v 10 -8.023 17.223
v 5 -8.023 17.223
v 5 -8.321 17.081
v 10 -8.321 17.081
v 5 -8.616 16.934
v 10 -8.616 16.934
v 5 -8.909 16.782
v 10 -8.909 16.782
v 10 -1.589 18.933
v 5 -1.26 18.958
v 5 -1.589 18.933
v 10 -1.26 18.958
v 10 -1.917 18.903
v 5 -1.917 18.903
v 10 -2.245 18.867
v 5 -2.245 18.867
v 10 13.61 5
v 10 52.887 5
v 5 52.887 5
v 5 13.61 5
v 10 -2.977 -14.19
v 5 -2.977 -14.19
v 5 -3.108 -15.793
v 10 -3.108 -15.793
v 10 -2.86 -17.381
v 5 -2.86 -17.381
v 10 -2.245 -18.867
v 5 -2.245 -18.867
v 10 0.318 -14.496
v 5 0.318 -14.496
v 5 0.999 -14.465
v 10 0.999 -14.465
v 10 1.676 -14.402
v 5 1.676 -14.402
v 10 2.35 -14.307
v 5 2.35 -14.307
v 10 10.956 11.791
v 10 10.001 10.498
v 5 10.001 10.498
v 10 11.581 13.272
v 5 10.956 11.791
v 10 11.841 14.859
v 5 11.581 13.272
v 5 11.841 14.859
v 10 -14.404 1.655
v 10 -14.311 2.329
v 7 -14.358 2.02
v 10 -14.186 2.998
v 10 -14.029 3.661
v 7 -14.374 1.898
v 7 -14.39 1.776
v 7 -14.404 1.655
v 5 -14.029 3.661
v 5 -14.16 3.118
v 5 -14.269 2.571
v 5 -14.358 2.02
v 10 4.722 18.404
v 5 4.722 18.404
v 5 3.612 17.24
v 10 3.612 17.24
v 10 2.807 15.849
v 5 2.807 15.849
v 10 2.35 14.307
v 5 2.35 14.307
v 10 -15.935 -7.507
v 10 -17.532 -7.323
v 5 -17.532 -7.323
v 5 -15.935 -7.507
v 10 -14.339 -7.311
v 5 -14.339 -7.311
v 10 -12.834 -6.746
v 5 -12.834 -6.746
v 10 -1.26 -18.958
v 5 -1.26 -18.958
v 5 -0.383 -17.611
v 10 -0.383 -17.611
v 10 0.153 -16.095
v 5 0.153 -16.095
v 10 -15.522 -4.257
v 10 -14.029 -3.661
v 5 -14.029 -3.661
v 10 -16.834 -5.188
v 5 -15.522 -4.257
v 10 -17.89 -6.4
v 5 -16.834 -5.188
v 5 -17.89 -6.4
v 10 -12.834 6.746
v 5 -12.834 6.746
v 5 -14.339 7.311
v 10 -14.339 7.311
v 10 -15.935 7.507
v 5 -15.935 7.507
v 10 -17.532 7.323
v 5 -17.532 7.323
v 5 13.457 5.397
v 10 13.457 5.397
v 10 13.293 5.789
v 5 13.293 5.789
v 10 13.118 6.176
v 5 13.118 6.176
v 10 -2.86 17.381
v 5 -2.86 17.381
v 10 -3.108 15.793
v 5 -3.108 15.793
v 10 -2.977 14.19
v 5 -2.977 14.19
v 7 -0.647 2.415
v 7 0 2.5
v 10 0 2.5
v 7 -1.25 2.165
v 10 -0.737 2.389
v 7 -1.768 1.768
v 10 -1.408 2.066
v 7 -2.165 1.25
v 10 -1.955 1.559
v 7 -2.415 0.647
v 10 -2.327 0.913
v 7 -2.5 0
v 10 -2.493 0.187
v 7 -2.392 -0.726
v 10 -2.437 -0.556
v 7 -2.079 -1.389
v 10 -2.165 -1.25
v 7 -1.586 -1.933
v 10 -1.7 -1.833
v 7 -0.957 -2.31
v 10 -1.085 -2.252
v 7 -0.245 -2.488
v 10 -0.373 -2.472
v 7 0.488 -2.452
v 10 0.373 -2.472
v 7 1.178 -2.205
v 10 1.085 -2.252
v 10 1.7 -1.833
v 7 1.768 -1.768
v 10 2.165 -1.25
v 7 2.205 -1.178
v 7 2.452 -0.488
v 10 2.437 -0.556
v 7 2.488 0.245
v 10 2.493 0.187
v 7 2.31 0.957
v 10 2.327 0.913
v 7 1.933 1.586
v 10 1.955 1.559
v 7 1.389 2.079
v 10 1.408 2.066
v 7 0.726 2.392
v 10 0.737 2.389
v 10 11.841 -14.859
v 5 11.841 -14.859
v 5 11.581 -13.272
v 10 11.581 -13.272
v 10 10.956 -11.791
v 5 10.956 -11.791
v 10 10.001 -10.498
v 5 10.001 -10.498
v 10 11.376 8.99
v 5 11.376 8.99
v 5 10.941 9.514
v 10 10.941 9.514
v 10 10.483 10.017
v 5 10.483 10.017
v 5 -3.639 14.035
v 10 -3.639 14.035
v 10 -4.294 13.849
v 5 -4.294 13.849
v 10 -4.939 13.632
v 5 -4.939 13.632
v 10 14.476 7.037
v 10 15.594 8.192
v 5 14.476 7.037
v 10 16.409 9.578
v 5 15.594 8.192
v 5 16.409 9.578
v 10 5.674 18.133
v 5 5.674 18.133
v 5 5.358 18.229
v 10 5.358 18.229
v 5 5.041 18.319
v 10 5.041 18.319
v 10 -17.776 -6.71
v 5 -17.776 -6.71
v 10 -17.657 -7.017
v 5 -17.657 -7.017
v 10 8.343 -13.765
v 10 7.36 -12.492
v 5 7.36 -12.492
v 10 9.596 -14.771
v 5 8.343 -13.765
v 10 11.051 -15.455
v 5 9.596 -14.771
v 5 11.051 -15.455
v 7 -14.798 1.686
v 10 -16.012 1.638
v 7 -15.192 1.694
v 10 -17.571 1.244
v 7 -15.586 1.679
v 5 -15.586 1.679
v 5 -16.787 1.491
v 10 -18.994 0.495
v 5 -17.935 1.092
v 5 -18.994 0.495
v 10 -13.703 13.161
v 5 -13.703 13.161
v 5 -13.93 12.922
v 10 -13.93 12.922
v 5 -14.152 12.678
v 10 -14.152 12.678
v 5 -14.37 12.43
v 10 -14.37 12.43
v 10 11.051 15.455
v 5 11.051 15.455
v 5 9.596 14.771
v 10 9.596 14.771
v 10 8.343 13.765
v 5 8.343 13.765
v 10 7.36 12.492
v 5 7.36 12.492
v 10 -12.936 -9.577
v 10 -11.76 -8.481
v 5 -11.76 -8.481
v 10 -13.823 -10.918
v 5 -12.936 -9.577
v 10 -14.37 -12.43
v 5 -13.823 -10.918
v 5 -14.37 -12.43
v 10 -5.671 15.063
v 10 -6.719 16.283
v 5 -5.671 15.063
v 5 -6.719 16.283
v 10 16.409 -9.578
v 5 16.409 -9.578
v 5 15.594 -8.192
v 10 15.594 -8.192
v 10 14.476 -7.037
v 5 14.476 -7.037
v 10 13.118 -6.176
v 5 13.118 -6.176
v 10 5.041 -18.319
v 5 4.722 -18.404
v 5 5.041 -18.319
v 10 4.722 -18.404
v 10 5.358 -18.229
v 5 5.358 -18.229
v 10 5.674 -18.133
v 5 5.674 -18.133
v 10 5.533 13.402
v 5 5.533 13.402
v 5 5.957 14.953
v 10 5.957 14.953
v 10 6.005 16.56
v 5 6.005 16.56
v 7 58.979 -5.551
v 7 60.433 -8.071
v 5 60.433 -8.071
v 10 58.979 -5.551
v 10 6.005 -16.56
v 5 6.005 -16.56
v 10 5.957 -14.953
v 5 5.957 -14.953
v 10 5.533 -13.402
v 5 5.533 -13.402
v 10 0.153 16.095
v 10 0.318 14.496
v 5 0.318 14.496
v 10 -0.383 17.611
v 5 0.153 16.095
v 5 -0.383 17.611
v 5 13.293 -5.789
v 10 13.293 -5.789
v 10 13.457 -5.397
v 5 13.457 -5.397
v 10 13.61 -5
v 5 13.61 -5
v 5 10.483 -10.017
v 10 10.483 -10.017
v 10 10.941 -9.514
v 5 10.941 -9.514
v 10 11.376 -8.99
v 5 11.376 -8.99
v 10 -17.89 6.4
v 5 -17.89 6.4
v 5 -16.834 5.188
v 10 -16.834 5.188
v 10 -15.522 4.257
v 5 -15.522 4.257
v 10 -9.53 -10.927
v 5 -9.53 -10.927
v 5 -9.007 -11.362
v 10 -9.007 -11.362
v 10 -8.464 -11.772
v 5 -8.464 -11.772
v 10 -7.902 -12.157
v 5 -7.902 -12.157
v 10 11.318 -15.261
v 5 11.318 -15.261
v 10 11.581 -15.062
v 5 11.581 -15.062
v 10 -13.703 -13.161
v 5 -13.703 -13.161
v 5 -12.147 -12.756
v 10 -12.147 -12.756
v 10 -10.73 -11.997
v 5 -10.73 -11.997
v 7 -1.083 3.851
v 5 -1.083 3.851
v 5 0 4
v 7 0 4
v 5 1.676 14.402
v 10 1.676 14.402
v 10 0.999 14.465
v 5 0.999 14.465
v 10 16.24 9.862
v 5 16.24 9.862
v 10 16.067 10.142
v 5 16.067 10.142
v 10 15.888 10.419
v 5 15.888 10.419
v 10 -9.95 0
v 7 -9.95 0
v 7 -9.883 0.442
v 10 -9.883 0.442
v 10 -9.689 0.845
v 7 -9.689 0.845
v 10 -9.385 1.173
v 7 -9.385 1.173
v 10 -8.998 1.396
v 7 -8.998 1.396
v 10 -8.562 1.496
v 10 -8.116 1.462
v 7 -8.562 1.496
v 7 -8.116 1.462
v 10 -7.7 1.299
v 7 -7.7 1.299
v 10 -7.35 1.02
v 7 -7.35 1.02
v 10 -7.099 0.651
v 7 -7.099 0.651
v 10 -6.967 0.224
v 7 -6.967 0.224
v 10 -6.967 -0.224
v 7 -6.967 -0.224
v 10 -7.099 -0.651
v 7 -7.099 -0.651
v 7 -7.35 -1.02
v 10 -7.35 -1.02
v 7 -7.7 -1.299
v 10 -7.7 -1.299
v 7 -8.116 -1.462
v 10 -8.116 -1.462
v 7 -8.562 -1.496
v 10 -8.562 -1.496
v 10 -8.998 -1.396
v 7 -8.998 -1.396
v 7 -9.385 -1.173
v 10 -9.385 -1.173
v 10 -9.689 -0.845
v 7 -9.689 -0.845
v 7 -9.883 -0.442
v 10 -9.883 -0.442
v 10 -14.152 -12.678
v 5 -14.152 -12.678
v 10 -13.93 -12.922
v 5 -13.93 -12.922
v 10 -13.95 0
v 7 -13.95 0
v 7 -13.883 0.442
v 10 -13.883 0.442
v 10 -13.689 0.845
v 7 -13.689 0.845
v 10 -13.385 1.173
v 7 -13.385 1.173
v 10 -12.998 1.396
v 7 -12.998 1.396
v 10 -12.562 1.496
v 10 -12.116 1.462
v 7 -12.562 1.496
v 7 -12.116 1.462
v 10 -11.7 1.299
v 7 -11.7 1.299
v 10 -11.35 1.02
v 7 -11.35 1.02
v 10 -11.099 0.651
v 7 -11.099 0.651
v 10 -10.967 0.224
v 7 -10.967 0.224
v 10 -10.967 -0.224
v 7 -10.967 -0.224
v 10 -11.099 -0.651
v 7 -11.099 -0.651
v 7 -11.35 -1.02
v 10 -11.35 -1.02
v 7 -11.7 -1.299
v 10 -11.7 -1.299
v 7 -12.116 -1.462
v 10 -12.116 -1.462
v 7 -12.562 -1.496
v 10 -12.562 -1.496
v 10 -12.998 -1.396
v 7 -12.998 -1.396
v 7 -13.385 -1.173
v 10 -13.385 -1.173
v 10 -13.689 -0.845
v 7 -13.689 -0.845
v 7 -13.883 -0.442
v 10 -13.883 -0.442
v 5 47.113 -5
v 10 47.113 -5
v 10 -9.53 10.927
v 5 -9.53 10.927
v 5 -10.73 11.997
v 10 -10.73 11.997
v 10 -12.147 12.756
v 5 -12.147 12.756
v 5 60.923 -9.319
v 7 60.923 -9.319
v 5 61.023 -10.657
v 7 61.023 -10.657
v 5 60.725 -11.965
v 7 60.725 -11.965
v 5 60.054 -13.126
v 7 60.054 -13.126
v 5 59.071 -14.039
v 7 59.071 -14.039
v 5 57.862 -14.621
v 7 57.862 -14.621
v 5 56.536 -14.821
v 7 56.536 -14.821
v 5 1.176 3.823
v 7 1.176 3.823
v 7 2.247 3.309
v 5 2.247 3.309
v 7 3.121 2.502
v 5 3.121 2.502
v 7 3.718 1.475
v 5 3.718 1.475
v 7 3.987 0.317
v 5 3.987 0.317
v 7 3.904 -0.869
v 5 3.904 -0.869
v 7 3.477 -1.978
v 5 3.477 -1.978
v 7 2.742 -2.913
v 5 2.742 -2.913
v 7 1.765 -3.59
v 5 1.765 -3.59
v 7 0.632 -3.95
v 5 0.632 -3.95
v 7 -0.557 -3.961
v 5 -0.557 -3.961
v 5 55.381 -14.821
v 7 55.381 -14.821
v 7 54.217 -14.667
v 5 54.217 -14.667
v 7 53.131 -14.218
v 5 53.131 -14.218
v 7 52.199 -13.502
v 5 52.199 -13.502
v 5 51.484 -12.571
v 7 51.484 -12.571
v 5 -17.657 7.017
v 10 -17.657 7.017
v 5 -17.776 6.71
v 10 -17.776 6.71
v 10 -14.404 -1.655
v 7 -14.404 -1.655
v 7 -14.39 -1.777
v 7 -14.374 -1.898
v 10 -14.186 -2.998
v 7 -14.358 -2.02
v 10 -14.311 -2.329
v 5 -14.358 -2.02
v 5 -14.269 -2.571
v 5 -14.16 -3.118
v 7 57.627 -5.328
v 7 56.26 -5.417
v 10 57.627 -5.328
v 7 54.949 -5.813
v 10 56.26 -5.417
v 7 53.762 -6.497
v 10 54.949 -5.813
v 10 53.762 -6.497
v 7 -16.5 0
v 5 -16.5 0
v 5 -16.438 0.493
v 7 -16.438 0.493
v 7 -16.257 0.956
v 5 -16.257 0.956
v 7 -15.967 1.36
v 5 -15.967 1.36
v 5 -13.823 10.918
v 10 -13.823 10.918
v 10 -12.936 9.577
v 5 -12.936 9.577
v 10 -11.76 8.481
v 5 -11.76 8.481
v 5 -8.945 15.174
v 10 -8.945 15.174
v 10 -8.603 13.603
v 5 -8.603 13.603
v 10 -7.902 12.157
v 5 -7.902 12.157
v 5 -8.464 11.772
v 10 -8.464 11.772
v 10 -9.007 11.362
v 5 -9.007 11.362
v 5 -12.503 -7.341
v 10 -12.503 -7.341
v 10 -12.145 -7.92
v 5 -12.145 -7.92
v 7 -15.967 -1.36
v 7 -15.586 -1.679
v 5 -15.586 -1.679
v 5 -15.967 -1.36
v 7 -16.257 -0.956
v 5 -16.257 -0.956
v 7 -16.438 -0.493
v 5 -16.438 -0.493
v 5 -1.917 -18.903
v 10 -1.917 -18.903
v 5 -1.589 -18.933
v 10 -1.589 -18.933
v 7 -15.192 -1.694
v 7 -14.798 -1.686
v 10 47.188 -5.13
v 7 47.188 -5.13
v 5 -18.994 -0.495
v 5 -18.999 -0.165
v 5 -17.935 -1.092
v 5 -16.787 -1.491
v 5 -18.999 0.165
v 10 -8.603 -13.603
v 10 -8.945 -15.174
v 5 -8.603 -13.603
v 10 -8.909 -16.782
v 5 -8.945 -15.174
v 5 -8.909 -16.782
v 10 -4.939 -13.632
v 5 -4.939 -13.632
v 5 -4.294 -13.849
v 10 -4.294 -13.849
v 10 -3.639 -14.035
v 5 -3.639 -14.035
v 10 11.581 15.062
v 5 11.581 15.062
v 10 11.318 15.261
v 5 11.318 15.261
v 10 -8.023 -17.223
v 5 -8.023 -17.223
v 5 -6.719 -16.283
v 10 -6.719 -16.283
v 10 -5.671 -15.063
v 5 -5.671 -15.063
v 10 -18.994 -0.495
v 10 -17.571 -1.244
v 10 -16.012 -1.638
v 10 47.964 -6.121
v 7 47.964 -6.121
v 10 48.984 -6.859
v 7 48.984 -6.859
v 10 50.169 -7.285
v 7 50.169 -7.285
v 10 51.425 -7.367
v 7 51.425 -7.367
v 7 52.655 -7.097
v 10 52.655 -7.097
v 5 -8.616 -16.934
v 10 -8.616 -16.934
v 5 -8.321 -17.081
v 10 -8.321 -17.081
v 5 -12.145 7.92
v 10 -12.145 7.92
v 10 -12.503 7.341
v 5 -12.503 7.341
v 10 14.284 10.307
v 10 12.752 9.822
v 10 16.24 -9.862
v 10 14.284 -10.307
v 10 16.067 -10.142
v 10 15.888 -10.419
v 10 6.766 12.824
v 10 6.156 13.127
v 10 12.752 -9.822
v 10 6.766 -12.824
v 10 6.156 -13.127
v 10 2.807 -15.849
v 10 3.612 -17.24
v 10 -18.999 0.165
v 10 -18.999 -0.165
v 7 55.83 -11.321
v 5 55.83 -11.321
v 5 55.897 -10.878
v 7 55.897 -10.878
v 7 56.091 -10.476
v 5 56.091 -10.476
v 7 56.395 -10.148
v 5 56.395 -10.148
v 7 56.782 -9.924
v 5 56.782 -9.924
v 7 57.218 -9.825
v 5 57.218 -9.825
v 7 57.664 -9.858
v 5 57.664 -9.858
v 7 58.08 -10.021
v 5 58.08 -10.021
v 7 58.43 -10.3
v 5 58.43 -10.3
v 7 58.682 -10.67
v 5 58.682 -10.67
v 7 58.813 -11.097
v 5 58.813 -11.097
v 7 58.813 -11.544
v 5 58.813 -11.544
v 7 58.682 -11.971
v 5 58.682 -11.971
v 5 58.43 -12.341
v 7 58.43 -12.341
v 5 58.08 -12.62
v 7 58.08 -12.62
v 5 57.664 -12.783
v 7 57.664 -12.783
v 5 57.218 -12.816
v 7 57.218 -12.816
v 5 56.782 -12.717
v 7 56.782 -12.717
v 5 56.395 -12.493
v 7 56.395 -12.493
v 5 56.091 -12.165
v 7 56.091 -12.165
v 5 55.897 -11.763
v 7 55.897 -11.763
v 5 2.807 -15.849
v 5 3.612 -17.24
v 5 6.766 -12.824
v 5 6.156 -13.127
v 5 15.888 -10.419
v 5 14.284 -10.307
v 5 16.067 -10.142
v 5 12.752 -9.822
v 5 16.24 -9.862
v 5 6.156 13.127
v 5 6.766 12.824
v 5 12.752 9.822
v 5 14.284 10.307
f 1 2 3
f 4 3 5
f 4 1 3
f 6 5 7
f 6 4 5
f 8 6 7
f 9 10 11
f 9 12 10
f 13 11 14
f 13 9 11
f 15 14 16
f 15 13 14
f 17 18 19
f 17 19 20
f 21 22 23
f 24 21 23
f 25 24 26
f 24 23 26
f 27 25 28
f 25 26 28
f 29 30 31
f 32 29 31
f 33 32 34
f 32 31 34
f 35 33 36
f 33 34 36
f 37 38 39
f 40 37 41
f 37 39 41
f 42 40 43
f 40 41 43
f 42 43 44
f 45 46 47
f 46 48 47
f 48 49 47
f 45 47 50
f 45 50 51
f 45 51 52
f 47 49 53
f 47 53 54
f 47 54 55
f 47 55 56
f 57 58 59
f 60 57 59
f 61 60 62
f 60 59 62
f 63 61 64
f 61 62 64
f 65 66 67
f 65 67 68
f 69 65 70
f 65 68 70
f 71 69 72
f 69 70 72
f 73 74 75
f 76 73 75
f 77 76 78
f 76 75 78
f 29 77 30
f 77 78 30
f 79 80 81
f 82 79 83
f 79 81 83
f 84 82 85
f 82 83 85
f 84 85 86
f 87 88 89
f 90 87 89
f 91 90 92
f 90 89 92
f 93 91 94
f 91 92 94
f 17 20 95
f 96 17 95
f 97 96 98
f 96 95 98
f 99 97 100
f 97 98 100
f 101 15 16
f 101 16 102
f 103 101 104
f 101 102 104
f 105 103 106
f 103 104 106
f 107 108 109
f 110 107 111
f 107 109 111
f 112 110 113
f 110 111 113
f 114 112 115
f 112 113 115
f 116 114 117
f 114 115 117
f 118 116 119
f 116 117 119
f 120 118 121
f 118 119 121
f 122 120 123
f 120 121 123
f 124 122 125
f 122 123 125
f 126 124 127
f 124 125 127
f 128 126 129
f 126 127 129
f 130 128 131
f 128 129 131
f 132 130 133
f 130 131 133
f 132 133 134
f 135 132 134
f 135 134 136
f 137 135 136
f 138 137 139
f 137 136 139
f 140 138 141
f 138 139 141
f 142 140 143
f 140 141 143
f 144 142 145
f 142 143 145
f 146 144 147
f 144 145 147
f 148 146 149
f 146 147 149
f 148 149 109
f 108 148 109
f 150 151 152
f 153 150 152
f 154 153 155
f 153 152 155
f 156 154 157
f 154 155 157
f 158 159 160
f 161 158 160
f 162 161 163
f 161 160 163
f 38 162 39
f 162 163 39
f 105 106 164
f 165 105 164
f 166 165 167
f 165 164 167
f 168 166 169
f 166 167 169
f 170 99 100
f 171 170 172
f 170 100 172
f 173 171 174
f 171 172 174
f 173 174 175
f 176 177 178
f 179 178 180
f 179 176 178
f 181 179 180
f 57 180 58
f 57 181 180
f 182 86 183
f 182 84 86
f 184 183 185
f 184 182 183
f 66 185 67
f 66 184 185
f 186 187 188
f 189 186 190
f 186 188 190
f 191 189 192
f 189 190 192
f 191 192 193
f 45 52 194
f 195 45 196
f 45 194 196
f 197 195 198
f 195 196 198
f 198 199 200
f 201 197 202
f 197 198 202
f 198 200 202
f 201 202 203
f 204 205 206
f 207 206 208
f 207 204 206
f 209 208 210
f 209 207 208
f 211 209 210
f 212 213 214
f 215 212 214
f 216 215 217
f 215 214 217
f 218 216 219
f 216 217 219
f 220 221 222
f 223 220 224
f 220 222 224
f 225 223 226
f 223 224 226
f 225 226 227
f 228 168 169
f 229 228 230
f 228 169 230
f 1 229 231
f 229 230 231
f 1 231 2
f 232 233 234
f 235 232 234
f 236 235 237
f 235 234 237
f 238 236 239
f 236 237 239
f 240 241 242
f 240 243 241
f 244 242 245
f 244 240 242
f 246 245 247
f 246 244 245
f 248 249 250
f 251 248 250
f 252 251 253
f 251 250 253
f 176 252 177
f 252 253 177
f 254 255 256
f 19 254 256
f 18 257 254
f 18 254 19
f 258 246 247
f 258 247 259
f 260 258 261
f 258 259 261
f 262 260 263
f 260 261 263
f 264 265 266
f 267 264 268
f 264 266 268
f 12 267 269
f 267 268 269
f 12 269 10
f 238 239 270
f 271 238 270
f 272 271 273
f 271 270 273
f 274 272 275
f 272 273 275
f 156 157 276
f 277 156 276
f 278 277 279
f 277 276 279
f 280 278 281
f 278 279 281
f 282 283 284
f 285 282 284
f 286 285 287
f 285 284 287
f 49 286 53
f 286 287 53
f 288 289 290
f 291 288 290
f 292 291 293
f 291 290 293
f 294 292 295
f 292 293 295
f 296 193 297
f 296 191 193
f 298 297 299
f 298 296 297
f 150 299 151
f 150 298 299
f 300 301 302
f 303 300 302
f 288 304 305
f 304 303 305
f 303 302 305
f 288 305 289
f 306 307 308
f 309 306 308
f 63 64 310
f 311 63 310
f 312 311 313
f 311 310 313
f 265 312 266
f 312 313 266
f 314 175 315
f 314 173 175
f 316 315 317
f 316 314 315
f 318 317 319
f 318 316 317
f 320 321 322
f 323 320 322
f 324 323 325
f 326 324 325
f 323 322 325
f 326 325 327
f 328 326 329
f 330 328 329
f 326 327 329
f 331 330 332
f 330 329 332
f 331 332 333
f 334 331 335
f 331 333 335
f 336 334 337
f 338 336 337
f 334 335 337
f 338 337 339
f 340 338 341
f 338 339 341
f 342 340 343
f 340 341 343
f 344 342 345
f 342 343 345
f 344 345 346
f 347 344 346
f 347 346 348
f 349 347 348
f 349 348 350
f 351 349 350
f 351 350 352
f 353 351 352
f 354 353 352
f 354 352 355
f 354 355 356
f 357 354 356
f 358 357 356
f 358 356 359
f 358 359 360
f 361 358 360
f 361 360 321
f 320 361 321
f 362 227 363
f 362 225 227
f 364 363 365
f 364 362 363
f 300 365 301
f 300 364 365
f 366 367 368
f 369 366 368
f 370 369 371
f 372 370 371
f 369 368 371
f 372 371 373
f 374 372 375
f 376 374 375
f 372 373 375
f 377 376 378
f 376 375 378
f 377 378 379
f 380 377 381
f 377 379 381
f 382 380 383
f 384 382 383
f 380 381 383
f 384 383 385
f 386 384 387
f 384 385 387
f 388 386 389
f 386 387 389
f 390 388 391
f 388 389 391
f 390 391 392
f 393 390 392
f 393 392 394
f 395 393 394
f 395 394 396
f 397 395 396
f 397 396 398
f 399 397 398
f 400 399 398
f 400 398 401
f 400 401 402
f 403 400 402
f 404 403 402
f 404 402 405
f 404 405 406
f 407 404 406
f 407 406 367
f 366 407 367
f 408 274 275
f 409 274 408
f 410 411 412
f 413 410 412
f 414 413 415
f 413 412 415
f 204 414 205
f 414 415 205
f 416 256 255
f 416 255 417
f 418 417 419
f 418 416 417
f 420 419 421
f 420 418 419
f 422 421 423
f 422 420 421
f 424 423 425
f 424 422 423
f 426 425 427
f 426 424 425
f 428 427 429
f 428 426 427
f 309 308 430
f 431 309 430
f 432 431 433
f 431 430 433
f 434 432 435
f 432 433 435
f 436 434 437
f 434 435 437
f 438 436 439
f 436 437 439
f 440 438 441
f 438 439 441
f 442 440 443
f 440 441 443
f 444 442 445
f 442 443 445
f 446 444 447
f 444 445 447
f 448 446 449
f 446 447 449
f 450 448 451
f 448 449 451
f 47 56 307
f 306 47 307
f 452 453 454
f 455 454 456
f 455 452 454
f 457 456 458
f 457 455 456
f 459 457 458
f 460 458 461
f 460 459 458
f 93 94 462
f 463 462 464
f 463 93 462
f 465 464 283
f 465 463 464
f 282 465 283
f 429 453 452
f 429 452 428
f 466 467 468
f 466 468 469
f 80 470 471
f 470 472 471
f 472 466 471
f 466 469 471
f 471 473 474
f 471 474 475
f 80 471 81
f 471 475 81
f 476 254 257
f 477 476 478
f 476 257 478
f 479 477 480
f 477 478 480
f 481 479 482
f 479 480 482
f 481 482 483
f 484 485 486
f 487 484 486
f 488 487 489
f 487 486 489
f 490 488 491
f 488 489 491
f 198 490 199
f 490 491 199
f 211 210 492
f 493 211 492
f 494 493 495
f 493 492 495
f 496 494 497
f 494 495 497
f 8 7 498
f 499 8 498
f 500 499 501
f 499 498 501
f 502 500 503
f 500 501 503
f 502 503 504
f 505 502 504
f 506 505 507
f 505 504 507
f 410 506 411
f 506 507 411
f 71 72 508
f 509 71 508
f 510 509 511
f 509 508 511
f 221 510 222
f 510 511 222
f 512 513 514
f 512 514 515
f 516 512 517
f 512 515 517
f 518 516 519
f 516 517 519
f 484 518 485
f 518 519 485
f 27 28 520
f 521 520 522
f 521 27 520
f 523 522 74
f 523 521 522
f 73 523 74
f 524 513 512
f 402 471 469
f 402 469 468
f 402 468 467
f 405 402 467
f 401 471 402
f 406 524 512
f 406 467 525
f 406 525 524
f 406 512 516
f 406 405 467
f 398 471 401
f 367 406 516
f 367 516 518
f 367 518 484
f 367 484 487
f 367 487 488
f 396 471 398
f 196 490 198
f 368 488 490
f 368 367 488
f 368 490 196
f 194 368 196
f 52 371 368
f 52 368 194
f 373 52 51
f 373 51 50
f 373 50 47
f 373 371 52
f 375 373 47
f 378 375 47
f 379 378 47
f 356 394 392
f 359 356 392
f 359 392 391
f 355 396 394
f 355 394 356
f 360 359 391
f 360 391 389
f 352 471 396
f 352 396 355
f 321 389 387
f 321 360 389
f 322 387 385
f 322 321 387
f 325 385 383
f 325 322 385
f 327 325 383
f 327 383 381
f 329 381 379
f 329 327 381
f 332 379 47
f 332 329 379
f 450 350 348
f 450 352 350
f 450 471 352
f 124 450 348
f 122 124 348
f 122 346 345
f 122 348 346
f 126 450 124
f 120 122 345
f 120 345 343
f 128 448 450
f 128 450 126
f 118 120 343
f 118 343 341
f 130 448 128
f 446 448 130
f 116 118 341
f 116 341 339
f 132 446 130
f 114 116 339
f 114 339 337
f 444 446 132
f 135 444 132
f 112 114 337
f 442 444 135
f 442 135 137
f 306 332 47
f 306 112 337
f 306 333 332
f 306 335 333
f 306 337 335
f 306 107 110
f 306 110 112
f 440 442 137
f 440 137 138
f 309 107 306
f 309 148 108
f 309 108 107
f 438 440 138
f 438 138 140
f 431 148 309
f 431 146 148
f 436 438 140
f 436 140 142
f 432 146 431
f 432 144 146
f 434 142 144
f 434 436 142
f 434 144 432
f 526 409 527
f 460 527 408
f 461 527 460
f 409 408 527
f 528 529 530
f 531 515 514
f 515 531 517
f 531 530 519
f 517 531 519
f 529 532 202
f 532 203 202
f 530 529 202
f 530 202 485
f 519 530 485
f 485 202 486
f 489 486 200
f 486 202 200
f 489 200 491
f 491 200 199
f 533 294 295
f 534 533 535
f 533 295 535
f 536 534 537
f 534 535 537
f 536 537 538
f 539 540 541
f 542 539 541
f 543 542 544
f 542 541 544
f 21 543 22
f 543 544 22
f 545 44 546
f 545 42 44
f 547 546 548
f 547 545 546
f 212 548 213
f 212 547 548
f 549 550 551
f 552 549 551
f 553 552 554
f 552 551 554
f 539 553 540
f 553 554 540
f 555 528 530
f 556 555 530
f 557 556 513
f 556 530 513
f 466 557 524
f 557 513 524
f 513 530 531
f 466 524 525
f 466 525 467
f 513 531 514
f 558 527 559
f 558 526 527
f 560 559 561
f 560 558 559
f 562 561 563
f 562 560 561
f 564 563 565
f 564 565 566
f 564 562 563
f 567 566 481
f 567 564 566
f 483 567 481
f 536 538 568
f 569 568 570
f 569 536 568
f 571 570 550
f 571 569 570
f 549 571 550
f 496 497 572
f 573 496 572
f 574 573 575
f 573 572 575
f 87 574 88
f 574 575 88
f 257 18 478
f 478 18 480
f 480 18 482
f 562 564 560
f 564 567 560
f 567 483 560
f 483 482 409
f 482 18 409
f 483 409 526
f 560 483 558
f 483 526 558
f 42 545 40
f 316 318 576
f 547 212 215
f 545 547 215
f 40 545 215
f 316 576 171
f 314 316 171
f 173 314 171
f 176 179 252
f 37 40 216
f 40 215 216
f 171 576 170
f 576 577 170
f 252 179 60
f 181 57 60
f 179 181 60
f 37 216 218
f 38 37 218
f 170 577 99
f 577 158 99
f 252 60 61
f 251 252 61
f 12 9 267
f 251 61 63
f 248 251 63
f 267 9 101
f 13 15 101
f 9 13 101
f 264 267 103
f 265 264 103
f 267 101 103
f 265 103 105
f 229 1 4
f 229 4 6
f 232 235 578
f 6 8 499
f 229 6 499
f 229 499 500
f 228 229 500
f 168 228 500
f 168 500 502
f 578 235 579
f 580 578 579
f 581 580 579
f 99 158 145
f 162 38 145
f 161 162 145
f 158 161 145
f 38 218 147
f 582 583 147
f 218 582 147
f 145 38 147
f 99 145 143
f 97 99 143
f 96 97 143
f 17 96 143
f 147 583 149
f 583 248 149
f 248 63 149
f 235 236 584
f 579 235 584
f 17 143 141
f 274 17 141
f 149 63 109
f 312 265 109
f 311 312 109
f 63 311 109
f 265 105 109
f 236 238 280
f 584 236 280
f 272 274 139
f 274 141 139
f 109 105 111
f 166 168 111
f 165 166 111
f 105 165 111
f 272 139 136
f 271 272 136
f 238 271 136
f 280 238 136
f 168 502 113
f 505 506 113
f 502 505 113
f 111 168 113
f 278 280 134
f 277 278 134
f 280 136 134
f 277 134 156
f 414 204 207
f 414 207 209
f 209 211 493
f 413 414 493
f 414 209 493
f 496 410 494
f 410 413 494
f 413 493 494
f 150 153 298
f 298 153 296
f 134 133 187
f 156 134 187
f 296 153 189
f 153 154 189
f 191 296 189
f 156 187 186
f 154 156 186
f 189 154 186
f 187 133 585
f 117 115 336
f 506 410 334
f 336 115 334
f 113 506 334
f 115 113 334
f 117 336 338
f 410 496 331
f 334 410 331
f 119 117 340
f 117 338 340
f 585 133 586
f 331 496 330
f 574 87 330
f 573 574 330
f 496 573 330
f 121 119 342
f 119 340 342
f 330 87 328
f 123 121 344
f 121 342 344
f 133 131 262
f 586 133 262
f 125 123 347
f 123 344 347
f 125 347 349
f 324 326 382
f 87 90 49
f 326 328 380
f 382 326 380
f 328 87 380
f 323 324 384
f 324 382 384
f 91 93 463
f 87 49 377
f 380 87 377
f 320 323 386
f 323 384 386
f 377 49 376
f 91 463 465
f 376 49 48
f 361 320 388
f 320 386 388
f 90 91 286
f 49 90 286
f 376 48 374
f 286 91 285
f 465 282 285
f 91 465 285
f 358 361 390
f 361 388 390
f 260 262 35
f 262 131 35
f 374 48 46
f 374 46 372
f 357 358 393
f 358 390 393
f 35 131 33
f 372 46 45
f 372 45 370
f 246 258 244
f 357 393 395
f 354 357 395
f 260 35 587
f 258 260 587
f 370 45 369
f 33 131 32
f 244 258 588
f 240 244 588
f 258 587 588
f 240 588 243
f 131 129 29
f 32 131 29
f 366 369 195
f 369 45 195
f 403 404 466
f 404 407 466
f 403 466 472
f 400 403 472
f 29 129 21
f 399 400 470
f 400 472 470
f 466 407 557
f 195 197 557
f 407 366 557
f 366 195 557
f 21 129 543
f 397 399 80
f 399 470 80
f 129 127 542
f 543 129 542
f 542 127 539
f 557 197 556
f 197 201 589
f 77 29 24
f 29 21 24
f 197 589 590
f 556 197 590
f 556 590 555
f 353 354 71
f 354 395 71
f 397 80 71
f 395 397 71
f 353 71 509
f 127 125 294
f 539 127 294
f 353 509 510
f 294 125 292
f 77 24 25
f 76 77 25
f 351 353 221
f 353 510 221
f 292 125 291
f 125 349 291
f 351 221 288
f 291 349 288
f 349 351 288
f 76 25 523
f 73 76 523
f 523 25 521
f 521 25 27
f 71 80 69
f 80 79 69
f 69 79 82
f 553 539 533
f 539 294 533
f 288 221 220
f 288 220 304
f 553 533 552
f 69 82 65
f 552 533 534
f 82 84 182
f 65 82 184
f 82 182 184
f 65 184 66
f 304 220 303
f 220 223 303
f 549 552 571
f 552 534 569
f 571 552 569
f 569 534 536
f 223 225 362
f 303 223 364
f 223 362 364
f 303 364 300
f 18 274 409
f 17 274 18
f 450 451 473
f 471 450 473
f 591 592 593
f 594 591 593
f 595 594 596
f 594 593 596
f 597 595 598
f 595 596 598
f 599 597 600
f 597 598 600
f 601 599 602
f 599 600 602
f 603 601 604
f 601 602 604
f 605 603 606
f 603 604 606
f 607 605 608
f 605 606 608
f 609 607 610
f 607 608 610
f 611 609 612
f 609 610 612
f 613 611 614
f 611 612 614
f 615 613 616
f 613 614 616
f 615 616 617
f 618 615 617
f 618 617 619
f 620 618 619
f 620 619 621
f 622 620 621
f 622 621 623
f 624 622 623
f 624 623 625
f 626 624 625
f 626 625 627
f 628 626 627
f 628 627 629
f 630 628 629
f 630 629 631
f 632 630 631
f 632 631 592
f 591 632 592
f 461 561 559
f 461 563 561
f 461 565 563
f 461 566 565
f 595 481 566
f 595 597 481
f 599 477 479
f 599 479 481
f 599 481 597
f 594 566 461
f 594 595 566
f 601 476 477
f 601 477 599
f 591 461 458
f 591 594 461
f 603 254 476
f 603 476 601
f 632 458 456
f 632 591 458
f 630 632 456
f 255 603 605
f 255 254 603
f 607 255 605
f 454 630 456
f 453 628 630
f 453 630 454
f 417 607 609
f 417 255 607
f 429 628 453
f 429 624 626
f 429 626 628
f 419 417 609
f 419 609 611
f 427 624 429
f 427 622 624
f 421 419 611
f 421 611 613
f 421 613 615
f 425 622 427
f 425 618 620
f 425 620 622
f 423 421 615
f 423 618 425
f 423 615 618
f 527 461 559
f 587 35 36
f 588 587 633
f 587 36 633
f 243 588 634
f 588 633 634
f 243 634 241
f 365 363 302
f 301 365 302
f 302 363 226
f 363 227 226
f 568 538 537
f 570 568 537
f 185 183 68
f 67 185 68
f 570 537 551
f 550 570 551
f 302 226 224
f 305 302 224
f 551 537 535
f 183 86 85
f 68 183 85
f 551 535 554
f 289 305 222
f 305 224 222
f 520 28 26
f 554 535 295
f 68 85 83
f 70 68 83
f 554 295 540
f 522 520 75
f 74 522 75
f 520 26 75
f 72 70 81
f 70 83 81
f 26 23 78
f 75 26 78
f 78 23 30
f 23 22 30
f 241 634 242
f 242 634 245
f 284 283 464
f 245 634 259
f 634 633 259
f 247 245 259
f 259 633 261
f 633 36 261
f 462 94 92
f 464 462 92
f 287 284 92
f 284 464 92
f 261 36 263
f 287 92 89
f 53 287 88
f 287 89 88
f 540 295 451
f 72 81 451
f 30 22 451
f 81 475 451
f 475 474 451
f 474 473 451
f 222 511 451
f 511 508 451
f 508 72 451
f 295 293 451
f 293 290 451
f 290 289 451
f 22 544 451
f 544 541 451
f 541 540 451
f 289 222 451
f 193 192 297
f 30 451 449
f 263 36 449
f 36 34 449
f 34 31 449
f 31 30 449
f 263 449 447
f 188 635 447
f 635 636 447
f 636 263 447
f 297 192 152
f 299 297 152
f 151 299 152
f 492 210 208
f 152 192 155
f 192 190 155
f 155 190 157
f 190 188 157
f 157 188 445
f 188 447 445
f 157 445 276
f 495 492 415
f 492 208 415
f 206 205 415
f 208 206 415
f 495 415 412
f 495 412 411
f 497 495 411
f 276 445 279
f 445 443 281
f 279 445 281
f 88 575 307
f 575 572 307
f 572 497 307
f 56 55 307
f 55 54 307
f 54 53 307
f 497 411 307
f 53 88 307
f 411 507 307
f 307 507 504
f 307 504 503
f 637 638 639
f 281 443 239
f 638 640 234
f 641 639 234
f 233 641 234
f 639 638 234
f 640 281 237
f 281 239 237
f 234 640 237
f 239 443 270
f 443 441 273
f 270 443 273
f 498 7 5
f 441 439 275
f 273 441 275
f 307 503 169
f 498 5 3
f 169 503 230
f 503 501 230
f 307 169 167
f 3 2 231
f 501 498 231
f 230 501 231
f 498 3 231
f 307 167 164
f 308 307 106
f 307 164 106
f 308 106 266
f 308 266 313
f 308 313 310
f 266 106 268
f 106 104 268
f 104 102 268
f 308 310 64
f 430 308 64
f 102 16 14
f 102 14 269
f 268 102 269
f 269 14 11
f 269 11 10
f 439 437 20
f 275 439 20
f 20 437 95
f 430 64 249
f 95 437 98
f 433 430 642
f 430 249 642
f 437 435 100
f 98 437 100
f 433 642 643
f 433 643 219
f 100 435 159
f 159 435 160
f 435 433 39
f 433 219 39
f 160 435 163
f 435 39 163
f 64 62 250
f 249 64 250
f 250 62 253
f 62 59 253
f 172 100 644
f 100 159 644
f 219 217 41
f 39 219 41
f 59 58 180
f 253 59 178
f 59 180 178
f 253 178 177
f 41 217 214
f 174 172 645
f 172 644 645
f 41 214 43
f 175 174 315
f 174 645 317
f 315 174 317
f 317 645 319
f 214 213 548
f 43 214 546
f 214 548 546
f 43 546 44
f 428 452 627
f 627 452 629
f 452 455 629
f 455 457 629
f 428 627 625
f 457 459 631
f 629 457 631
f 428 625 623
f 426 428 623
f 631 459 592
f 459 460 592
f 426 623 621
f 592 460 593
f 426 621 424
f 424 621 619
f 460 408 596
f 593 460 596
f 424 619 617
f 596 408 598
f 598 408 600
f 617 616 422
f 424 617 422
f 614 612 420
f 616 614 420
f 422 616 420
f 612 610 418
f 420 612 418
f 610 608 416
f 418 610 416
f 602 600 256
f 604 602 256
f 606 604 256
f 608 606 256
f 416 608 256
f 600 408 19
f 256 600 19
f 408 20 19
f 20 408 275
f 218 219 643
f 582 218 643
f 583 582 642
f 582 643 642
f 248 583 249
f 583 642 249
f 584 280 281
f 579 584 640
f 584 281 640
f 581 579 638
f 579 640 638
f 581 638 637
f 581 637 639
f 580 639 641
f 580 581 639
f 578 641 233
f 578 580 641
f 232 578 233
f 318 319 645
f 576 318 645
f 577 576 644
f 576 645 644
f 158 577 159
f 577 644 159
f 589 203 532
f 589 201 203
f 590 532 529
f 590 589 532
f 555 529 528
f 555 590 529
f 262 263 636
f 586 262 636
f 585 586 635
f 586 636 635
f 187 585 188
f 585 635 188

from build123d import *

# Parameters (mm, degrees)
BASPROSKE_W             = 10
BASPROSKE_H             = 19
TOOTHCUT_DEPTH          = 29.670542374
TEETHCUTS_COUNT         = 17
TEETHCUTS_ANGLE         = 338.823529412
BORSKE_R                = 2.5
BORE_DEPTH              = 50.0019304
CUT_EXTRUDE1_DEPTH      = 20
CUT_EXTRUDE1_DEPTH_BACK = 20
SKETCH1_W               = 10
SKETCH1_H               = 40
BOSS_EXTRUDE1_DEPTH     = 5
SKETCH5_R               = 1.5
CUT_EXTRUDE5_DEPTH      = 68.251600881
FILLET2_R               = 4.5
CUT_EXTRUDE7_DEPTH      = 3
CUT_EXTRUDE8_DEPTH      = 2
SKETCH8_R               = 1.5
CUT_EXTRUDE9_DEPTH      = 64.982759166
FILLET3_R               = 4.5


with BuildPart() as part:
    # BasProSke → Base-Revolve (revolve)
    with BuildSketch(Plane(origin=(0, 0, 0), x_dir=(1, 0, 0), z_dir=(0, 1, 0))):
        with Locations((5, 9.5)):
            Rectangle(BASPROSKE_W, BASPROSKE_H)
    revolve(axis=Axis((-10, 0, 0), (1, 0, 0)))

    # TooCutSke → ToothCut (cut, through all)
    with BuildSketch(Plane(origin=(0, 0, 0), x_dir=(0, 0, -1), z_dir=(1, 0, 0))):
        with BuildLine():
            ThreePointArc((1.020352389, 14.463052306), (0, 14.499), (-1.020352389, 14.463052306))
            ThreePointArc((-1.020352389, 14.463052306), (-1.632621885, 16.804485203), (-3.026143023, 18.783192049))
            ThreePointArc((-3.026143023, 18.783192049), (0, 19.0254), (3.026143023, 18.783192049))
            ThreePointArc((3.026143023, 18.783192049), (1.632621885, 16.804485203), (1.020352389, 14.463052306))
        make_face()
    toothcut = extrude(amount=TOOTHCUT_DEPTH, mode=Mode.SUBTRACT)

    # TeethCuts: ToothCut ×17 about axis
    teethcuts_axis = Axis((-10, 0, 0), (1, 0, 0))
    for i in range(1, TEETHCUTS_COUNT):
        add(toothcut.rotate(teethcuts_axis, i * TEETHCUTS_ANGLE / (TEETHCUTS_COUNT - 1)), mode=Mode.SUBTRACT)

    # BorSke → Bore (cut, symmetric)
    with BuildSketch(Plane(origin=(0, 0, 0), x_dir=(0, 0, -1), z_dir=(1, 0, 0))):
        Circle(BORSKE_R)
    extrude(amount=BORE_DEPTH, both=True, mode=Mode.SUBTRACT)

    # Sketch1 → Cut-Extrude1 (cut, two sides: drawn at the far end of the back side and taken through both)
    with BuildSketch(Plane.XY.offset(-CUT_EXTRUDE1_DEPTH_BACK)):
        Rectangle(SKETCH1_W, SKETCH1_H)
    extrude(amount=CUT_EXTRUDE1_DEPTH + CUT_EXTRUDE1_DEPTH_BACK, mode=Mode.SUBTRACT)

    # Sketch4 → Boss-Extrude1 (add)
    with BuildSketch(Plane(origin=(10, 0, 0), x_dir=(0, 0, -1), z_dir=(1, 0, 0))):
        with BuildLine():
            Line((5, 0), (5, 47.113248654))
            Line((5, 47.113248654), (14.820508076, 52.783121635))
            Line((14.820508076, 52.783121635), (14.820508076, 64.330127019))
            Line((14.820508076, 64.330127019), (-5, 52.886751346))
            Line((-5, 52.886751346), (-5, 0))
            Line((-5, 0), (-2.5, 0))
            ThreePointArc((-2.5, 0), (0, 2.5), (2.5, 0))
            Line((2.5, 0), (5, 0))
        make_face()
    extrude(amount=-BOSS_EXTRUDE1_DEPTH)

    # Sketch5 → Cut-Extrude5 (cut, through all)
    with BuildSketch(Plane.ZY.offset(-5)):
        with Locations((-11.320508076, 57.330127019)):
            Circle(SKETCH5_R)
    extrude(amount=-CUT_EXTRUDE5_DEPTH, mode=Mode.SUBTRACT)

    # Fillet2
    fillet2_edges = [part.edges().sort_by_distance(p)[0] for p in [
        (7.5, 52.783121635, -14.820508076),
        (7.5, 64.330127019, -14.820508076),
    ]]
    fillet(fillet2_edges, radius=FILLET2_R)

    # Sketch7 → Cut-Extrude7 (cut)
    with BuildSketch(Plane(origin=(10, 0, 0), x_dir=(0, 0, -1), z_dir=(1, 0, 0))):
        with BuildLine():
            Line((17.722340532, 67.954429941), (8.320508076, 62.526279442))
            ThreePointArc((8.320508076, 62.526279442), (6.124355653, 54.330127019), (14.320508076, 52.133974596))
            Line((14.320508076, 52.133974596), (23.722340532, 57.562125096))
            Line((23.722340532, 57.562125096), (17.722340532, 67.954429941))
        make_face()
    extrude(amount=-CUT_EXTRUDE7_DEPTH, mode=Mode.SUBTRACT)

    # Sketch2 → Cut-Extrude8 (cut)
    with BuildSketch(Plane.ZY.offset(-5)):
        with BuildLine():
            Line((2, -14.5), (4, 0))
            ThreePointArc((4, 0), (-0.279231906, 3.99024179), (-3.961014771, -0.557101411))
            Line((-3.961014771, -0.557101411), (-2, -14.5))
            ThreePointArc((-2, -14.5), (0, -16.5), (2, -14.5))
        make_face()
    extrude(amount=-CUT_EXTRUDE8_DEPTH, mode=Mode.SUBTRACT)

    # Sketch8 → Cut-Extrude9 (cut, through all)
    with BuildSketch(Plane.ZY.offset(-7)):
        with Locations((0, -8.45)):
            Circle(SKETCH8_R)
        with Locations((0, -12.45)):
            Circle(SKETCH8_R)
    extrude(amount=-CUT_EXTRUDE9_DEPTH, mode=Mode.SUBTRACT)

    # Fillet3
    fillet3_edges = [part.edges().sort_by_distance(p)[0] for p in [
        (8.5, 51.449252752, -12.5101794),
    ]]
    fillet(fillet3_edges, radius=FILLET3_R)


solid = part.part
